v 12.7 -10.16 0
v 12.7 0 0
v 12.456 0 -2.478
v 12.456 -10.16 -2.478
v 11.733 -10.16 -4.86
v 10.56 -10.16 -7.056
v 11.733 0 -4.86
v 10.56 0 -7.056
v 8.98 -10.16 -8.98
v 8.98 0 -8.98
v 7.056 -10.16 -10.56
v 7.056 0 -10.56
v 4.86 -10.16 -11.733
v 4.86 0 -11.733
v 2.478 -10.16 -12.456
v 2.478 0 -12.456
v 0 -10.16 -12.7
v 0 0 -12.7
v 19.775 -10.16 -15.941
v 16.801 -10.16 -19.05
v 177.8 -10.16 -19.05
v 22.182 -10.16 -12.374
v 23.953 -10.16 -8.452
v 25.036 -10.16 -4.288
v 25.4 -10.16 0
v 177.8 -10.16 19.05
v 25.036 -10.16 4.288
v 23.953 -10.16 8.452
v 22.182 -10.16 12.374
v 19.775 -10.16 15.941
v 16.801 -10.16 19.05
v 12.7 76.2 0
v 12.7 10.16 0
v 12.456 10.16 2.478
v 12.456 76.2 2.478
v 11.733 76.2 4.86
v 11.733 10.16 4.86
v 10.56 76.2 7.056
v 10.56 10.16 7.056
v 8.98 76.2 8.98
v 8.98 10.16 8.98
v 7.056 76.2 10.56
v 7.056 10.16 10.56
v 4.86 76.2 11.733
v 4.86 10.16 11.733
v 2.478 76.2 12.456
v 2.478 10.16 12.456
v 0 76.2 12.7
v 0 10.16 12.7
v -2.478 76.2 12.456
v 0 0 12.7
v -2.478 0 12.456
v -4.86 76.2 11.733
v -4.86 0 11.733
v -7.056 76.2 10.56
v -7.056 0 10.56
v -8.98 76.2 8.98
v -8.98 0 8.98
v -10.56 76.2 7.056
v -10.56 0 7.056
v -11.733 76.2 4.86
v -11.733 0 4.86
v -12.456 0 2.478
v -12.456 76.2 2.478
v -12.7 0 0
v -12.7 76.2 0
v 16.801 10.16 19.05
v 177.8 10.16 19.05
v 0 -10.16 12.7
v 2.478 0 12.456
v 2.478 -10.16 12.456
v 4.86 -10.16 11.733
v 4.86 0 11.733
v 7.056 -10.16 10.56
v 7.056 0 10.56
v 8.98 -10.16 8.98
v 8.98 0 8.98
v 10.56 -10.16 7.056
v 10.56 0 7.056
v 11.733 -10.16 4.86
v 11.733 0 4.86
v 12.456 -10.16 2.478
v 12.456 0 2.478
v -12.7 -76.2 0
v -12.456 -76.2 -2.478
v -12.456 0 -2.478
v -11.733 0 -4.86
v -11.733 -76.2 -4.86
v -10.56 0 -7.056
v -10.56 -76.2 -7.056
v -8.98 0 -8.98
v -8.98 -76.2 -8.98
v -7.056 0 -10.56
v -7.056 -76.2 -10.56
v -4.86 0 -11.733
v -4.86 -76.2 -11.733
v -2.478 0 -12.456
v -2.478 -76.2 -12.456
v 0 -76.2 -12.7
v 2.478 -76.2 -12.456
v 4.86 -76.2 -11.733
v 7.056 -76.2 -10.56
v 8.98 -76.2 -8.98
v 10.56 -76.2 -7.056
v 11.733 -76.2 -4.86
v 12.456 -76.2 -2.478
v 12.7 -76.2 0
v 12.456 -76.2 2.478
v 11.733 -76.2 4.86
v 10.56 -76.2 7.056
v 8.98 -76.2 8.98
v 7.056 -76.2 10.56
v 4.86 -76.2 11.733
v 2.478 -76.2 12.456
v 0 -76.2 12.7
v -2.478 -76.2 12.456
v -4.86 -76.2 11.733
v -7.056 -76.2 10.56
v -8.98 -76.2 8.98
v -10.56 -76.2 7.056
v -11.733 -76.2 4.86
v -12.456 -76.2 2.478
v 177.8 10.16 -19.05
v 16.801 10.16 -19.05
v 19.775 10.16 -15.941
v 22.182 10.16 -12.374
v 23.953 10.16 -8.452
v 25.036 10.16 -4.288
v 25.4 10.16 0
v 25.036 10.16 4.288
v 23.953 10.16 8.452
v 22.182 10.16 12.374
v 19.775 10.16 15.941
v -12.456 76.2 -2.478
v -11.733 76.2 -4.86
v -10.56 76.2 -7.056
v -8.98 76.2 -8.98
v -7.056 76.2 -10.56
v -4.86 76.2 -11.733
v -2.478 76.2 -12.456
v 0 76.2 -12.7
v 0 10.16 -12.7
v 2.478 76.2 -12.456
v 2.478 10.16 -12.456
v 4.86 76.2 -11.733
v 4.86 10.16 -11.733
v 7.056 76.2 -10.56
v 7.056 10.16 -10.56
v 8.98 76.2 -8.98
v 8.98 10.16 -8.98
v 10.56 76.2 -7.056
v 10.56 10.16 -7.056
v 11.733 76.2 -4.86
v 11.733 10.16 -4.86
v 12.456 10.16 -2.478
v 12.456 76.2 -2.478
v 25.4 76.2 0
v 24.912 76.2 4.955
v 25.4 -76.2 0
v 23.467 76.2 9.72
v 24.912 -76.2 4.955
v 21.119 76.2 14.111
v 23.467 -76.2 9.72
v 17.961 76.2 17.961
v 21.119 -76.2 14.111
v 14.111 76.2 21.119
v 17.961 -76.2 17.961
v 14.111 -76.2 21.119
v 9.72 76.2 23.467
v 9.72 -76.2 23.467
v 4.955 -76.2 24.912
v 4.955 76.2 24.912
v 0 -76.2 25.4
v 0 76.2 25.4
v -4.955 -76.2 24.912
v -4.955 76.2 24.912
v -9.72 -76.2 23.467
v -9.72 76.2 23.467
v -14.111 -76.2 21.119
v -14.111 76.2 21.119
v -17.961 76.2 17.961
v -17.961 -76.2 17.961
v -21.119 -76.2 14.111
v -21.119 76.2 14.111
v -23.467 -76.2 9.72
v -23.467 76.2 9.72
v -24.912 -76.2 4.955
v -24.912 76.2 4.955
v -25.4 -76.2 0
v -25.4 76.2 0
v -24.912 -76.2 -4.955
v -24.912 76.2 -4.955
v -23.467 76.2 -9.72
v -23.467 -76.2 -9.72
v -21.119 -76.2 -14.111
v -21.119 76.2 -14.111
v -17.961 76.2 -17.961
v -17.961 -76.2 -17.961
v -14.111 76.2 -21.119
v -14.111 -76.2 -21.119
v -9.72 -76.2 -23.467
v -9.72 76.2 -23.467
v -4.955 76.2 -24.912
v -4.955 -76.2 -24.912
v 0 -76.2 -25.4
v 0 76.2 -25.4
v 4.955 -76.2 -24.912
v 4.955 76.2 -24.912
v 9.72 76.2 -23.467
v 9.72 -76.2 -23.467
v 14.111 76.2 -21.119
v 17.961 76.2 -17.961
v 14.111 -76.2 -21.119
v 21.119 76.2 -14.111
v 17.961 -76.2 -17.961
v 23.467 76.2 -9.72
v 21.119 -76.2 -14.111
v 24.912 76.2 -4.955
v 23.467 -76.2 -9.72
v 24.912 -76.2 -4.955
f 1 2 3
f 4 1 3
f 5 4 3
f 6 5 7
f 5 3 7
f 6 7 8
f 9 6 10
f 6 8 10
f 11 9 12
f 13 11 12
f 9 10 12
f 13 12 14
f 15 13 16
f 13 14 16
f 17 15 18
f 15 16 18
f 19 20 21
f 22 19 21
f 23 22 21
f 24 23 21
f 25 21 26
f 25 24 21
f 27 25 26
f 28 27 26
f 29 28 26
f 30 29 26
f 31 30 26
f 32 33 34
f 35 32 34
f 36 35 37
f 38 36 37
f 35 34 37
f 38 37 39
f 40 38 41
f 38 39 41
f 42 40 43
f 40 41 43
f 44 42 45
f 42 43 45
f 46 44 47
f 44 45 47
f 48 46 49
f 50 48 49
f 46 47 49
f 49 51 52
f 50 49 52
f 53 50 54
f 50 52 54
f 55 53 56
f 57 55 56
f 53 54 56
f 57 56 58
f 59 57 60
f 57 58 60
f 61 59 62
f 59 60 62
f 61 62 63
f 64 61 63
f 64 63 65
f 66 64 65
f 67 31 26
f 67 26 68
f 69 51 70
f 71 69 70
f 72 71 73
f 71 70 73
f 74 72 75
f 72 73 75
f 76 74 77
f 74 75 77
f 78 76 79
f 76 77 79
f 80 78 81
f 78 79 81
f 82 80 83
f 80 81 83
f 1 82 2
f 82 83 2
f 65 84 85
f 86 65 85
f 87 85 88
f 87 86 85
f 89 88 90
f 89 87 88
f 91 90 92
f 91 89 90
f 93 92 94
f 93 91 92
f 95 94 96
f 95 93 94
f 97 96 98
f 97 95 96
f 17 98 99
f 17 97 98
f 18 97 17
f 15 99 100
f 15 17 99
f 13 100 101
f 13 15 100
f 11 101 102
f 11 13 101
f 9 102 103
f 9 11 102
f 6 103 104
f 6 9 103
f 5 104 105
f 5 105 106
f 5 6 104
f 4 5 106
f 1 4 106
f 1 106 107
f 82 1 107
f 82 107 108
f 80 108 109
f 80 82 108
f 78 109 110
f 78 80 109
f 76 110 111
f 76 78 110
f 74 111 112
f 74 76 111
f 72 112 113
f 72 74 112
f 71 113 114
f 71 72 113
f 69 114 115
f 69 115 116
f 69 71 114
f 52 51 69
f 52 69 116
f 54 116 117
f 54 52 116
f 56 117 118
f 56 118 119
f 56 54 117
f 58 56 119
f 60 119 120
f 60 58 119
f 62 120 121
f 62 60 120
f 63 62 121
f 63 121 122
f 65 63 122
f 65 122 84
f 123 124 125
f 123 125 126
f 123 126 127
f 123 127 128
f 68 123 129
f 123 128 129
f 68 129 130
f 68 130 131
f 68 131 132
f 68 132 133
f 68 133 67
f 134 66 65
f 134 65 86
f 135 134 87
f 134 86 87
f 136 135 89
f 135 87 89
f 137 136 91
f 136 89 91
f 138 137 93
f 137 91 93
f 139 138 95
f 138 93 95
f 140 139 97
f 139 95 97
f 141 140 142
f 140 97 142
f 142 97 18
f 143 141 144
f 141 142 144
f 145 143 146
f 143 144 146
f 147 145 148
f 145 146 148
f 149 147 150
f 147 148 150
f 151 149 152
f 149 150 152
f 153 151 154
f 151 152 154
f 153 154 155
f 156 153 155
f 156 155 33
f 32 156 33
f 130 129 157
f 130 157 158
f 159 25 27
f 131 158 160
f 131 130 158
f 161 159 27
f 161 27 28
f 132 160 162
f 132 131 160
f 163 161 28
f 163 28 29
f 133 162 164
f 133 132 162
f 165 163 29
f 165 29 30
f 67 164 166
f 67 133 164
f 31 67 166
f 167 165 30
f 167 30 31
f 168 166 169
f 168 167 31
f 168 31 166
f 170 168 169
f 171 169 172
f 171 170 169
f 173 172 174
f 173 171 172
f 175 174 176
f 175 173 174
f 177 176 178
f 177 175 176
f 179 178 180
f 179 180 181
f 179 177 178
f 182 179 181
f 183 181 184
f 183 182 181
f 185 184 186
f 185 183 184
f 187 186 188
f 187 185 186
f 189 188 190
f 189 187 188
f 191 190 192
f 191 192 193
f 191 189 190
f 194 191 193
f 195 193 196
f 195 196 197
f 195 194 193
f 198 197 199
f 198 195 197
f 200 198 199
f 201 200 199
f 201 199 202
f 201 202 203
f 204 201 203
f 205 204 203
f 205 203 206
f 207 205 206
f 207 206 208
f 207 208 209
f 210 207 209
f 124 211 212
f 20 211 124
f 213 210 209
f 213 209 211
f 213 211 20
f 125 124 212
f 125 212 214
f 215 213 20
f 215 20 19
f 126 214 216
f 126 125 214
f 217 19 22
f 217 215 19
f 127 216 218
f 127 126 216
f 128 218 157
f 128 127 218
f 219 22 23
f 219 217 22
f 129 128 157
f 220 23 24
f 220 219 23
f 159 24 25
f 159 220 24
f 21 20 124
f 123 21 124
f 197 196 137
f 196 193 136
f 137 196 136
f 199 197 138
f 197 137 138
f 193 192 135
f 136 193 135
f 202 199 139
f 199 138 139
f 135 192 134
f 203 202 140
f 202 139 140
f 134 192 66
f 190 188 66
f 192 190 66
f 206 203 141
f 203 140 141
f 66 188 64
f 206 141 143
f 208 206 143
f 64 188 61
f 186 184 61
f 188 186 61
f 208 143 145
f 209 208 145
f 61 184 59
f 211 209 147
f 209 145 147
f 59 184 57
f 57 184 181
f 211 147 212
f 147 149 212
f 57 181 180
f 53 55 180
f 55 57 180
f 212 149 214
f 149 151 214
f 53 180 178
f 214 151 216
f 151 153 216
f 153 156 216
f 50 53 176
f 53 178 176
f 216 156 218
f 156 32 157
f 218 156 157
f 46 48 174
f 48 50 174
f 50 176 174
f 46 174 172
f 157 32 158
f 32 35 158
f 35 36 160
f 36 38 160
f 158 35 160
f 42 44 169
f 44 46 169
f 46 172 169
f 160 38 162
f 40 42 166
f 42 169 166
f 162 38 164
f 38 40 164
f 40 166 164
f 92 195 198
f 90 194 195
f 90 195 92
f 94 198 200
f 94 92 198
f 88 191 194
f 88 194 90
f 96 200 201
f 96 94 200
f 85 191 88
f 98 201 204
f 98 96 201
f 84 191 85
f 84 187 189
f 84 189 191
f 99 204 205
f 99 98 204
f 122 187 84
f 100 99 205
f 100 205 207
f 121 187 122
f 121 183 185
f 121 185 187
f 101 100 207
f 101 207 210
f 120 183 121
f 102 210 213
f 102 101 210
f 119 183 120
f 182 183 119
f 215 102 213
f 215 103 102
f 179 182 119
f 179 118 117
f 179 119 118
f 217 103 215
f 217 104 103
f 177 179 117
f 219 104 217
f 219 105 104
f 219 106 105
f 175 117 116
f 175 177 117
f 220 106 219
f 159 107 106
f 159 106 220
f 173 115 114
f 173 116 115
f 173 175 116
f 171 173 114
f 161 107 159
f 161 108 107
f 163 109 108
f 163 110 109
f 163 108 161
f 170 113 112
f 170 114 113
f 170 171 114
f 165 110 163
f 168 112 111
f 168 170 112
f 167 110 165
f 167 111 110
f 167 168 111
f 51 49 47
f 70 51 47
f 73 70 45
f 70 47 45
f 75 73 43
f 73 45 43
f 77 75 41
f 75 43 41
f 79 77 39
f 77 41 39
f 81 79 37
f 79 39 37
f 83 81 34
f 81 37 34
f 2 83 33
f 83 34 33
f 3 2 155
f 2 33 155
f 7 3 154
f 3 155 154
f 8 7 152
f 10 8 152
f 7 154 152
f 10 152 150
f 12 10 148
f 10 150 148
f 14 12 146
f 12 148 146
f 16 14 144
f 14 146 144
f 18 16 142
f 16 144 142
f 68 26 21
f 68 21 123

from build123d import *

# Parameters (mm, degrees)
F0_R     = 25.4
F0_R_2   = 12.7
F1_DEPTH = 76.2
F2_DEPTH = 76.2
F3_W     = 20.32
F3_H     = 38.1
F4_DEPTH = 177.8
F5_D     = 25.4
F5_DEPTH = 76.201
F6_D     = 25.4


with BuildPart() as f1:
    # F0 (on Front) → F1 (new body)
    with BuildSketch(Plane.XZ):
        Circle(F0_R)
        Circle(F0_R_2, mode=Mode.SUBTRACT)
    extrude(amount=F1_DEPTH)

    # F2 (add): a face of the model
    f2_faces = [f1.faces().sort_by_distance(p)[0] for p in [
        (-24.6815795103, 0, 0),
    ]]
    extrude(f2_faces, amount=F2_DEPTH)

    # F3 (on Right) → F4 (join)
    with BuildSketch(Plane.YZ):
        Rectangle(F3_W, F3_H)
    extrude(amount=F4_DEPTH)

    # F5 (through all, one way)
    with BuildSketch(Plane(origin=(0, 0, 0), x_dir=(1, 0, 0), z_dir=(0, 1, 0))):
        with Locations((0, 0)):
            Circle(F5_D / 2)
    extrude(amount=-F5_DEPTH, mode=Mode.SUBTRACT)

    # F6 (through all)
    with Locations(Plane.XZ):
        with Locations((0, 0)):
            Hole(F6_D / 2)


solid = f1.part
